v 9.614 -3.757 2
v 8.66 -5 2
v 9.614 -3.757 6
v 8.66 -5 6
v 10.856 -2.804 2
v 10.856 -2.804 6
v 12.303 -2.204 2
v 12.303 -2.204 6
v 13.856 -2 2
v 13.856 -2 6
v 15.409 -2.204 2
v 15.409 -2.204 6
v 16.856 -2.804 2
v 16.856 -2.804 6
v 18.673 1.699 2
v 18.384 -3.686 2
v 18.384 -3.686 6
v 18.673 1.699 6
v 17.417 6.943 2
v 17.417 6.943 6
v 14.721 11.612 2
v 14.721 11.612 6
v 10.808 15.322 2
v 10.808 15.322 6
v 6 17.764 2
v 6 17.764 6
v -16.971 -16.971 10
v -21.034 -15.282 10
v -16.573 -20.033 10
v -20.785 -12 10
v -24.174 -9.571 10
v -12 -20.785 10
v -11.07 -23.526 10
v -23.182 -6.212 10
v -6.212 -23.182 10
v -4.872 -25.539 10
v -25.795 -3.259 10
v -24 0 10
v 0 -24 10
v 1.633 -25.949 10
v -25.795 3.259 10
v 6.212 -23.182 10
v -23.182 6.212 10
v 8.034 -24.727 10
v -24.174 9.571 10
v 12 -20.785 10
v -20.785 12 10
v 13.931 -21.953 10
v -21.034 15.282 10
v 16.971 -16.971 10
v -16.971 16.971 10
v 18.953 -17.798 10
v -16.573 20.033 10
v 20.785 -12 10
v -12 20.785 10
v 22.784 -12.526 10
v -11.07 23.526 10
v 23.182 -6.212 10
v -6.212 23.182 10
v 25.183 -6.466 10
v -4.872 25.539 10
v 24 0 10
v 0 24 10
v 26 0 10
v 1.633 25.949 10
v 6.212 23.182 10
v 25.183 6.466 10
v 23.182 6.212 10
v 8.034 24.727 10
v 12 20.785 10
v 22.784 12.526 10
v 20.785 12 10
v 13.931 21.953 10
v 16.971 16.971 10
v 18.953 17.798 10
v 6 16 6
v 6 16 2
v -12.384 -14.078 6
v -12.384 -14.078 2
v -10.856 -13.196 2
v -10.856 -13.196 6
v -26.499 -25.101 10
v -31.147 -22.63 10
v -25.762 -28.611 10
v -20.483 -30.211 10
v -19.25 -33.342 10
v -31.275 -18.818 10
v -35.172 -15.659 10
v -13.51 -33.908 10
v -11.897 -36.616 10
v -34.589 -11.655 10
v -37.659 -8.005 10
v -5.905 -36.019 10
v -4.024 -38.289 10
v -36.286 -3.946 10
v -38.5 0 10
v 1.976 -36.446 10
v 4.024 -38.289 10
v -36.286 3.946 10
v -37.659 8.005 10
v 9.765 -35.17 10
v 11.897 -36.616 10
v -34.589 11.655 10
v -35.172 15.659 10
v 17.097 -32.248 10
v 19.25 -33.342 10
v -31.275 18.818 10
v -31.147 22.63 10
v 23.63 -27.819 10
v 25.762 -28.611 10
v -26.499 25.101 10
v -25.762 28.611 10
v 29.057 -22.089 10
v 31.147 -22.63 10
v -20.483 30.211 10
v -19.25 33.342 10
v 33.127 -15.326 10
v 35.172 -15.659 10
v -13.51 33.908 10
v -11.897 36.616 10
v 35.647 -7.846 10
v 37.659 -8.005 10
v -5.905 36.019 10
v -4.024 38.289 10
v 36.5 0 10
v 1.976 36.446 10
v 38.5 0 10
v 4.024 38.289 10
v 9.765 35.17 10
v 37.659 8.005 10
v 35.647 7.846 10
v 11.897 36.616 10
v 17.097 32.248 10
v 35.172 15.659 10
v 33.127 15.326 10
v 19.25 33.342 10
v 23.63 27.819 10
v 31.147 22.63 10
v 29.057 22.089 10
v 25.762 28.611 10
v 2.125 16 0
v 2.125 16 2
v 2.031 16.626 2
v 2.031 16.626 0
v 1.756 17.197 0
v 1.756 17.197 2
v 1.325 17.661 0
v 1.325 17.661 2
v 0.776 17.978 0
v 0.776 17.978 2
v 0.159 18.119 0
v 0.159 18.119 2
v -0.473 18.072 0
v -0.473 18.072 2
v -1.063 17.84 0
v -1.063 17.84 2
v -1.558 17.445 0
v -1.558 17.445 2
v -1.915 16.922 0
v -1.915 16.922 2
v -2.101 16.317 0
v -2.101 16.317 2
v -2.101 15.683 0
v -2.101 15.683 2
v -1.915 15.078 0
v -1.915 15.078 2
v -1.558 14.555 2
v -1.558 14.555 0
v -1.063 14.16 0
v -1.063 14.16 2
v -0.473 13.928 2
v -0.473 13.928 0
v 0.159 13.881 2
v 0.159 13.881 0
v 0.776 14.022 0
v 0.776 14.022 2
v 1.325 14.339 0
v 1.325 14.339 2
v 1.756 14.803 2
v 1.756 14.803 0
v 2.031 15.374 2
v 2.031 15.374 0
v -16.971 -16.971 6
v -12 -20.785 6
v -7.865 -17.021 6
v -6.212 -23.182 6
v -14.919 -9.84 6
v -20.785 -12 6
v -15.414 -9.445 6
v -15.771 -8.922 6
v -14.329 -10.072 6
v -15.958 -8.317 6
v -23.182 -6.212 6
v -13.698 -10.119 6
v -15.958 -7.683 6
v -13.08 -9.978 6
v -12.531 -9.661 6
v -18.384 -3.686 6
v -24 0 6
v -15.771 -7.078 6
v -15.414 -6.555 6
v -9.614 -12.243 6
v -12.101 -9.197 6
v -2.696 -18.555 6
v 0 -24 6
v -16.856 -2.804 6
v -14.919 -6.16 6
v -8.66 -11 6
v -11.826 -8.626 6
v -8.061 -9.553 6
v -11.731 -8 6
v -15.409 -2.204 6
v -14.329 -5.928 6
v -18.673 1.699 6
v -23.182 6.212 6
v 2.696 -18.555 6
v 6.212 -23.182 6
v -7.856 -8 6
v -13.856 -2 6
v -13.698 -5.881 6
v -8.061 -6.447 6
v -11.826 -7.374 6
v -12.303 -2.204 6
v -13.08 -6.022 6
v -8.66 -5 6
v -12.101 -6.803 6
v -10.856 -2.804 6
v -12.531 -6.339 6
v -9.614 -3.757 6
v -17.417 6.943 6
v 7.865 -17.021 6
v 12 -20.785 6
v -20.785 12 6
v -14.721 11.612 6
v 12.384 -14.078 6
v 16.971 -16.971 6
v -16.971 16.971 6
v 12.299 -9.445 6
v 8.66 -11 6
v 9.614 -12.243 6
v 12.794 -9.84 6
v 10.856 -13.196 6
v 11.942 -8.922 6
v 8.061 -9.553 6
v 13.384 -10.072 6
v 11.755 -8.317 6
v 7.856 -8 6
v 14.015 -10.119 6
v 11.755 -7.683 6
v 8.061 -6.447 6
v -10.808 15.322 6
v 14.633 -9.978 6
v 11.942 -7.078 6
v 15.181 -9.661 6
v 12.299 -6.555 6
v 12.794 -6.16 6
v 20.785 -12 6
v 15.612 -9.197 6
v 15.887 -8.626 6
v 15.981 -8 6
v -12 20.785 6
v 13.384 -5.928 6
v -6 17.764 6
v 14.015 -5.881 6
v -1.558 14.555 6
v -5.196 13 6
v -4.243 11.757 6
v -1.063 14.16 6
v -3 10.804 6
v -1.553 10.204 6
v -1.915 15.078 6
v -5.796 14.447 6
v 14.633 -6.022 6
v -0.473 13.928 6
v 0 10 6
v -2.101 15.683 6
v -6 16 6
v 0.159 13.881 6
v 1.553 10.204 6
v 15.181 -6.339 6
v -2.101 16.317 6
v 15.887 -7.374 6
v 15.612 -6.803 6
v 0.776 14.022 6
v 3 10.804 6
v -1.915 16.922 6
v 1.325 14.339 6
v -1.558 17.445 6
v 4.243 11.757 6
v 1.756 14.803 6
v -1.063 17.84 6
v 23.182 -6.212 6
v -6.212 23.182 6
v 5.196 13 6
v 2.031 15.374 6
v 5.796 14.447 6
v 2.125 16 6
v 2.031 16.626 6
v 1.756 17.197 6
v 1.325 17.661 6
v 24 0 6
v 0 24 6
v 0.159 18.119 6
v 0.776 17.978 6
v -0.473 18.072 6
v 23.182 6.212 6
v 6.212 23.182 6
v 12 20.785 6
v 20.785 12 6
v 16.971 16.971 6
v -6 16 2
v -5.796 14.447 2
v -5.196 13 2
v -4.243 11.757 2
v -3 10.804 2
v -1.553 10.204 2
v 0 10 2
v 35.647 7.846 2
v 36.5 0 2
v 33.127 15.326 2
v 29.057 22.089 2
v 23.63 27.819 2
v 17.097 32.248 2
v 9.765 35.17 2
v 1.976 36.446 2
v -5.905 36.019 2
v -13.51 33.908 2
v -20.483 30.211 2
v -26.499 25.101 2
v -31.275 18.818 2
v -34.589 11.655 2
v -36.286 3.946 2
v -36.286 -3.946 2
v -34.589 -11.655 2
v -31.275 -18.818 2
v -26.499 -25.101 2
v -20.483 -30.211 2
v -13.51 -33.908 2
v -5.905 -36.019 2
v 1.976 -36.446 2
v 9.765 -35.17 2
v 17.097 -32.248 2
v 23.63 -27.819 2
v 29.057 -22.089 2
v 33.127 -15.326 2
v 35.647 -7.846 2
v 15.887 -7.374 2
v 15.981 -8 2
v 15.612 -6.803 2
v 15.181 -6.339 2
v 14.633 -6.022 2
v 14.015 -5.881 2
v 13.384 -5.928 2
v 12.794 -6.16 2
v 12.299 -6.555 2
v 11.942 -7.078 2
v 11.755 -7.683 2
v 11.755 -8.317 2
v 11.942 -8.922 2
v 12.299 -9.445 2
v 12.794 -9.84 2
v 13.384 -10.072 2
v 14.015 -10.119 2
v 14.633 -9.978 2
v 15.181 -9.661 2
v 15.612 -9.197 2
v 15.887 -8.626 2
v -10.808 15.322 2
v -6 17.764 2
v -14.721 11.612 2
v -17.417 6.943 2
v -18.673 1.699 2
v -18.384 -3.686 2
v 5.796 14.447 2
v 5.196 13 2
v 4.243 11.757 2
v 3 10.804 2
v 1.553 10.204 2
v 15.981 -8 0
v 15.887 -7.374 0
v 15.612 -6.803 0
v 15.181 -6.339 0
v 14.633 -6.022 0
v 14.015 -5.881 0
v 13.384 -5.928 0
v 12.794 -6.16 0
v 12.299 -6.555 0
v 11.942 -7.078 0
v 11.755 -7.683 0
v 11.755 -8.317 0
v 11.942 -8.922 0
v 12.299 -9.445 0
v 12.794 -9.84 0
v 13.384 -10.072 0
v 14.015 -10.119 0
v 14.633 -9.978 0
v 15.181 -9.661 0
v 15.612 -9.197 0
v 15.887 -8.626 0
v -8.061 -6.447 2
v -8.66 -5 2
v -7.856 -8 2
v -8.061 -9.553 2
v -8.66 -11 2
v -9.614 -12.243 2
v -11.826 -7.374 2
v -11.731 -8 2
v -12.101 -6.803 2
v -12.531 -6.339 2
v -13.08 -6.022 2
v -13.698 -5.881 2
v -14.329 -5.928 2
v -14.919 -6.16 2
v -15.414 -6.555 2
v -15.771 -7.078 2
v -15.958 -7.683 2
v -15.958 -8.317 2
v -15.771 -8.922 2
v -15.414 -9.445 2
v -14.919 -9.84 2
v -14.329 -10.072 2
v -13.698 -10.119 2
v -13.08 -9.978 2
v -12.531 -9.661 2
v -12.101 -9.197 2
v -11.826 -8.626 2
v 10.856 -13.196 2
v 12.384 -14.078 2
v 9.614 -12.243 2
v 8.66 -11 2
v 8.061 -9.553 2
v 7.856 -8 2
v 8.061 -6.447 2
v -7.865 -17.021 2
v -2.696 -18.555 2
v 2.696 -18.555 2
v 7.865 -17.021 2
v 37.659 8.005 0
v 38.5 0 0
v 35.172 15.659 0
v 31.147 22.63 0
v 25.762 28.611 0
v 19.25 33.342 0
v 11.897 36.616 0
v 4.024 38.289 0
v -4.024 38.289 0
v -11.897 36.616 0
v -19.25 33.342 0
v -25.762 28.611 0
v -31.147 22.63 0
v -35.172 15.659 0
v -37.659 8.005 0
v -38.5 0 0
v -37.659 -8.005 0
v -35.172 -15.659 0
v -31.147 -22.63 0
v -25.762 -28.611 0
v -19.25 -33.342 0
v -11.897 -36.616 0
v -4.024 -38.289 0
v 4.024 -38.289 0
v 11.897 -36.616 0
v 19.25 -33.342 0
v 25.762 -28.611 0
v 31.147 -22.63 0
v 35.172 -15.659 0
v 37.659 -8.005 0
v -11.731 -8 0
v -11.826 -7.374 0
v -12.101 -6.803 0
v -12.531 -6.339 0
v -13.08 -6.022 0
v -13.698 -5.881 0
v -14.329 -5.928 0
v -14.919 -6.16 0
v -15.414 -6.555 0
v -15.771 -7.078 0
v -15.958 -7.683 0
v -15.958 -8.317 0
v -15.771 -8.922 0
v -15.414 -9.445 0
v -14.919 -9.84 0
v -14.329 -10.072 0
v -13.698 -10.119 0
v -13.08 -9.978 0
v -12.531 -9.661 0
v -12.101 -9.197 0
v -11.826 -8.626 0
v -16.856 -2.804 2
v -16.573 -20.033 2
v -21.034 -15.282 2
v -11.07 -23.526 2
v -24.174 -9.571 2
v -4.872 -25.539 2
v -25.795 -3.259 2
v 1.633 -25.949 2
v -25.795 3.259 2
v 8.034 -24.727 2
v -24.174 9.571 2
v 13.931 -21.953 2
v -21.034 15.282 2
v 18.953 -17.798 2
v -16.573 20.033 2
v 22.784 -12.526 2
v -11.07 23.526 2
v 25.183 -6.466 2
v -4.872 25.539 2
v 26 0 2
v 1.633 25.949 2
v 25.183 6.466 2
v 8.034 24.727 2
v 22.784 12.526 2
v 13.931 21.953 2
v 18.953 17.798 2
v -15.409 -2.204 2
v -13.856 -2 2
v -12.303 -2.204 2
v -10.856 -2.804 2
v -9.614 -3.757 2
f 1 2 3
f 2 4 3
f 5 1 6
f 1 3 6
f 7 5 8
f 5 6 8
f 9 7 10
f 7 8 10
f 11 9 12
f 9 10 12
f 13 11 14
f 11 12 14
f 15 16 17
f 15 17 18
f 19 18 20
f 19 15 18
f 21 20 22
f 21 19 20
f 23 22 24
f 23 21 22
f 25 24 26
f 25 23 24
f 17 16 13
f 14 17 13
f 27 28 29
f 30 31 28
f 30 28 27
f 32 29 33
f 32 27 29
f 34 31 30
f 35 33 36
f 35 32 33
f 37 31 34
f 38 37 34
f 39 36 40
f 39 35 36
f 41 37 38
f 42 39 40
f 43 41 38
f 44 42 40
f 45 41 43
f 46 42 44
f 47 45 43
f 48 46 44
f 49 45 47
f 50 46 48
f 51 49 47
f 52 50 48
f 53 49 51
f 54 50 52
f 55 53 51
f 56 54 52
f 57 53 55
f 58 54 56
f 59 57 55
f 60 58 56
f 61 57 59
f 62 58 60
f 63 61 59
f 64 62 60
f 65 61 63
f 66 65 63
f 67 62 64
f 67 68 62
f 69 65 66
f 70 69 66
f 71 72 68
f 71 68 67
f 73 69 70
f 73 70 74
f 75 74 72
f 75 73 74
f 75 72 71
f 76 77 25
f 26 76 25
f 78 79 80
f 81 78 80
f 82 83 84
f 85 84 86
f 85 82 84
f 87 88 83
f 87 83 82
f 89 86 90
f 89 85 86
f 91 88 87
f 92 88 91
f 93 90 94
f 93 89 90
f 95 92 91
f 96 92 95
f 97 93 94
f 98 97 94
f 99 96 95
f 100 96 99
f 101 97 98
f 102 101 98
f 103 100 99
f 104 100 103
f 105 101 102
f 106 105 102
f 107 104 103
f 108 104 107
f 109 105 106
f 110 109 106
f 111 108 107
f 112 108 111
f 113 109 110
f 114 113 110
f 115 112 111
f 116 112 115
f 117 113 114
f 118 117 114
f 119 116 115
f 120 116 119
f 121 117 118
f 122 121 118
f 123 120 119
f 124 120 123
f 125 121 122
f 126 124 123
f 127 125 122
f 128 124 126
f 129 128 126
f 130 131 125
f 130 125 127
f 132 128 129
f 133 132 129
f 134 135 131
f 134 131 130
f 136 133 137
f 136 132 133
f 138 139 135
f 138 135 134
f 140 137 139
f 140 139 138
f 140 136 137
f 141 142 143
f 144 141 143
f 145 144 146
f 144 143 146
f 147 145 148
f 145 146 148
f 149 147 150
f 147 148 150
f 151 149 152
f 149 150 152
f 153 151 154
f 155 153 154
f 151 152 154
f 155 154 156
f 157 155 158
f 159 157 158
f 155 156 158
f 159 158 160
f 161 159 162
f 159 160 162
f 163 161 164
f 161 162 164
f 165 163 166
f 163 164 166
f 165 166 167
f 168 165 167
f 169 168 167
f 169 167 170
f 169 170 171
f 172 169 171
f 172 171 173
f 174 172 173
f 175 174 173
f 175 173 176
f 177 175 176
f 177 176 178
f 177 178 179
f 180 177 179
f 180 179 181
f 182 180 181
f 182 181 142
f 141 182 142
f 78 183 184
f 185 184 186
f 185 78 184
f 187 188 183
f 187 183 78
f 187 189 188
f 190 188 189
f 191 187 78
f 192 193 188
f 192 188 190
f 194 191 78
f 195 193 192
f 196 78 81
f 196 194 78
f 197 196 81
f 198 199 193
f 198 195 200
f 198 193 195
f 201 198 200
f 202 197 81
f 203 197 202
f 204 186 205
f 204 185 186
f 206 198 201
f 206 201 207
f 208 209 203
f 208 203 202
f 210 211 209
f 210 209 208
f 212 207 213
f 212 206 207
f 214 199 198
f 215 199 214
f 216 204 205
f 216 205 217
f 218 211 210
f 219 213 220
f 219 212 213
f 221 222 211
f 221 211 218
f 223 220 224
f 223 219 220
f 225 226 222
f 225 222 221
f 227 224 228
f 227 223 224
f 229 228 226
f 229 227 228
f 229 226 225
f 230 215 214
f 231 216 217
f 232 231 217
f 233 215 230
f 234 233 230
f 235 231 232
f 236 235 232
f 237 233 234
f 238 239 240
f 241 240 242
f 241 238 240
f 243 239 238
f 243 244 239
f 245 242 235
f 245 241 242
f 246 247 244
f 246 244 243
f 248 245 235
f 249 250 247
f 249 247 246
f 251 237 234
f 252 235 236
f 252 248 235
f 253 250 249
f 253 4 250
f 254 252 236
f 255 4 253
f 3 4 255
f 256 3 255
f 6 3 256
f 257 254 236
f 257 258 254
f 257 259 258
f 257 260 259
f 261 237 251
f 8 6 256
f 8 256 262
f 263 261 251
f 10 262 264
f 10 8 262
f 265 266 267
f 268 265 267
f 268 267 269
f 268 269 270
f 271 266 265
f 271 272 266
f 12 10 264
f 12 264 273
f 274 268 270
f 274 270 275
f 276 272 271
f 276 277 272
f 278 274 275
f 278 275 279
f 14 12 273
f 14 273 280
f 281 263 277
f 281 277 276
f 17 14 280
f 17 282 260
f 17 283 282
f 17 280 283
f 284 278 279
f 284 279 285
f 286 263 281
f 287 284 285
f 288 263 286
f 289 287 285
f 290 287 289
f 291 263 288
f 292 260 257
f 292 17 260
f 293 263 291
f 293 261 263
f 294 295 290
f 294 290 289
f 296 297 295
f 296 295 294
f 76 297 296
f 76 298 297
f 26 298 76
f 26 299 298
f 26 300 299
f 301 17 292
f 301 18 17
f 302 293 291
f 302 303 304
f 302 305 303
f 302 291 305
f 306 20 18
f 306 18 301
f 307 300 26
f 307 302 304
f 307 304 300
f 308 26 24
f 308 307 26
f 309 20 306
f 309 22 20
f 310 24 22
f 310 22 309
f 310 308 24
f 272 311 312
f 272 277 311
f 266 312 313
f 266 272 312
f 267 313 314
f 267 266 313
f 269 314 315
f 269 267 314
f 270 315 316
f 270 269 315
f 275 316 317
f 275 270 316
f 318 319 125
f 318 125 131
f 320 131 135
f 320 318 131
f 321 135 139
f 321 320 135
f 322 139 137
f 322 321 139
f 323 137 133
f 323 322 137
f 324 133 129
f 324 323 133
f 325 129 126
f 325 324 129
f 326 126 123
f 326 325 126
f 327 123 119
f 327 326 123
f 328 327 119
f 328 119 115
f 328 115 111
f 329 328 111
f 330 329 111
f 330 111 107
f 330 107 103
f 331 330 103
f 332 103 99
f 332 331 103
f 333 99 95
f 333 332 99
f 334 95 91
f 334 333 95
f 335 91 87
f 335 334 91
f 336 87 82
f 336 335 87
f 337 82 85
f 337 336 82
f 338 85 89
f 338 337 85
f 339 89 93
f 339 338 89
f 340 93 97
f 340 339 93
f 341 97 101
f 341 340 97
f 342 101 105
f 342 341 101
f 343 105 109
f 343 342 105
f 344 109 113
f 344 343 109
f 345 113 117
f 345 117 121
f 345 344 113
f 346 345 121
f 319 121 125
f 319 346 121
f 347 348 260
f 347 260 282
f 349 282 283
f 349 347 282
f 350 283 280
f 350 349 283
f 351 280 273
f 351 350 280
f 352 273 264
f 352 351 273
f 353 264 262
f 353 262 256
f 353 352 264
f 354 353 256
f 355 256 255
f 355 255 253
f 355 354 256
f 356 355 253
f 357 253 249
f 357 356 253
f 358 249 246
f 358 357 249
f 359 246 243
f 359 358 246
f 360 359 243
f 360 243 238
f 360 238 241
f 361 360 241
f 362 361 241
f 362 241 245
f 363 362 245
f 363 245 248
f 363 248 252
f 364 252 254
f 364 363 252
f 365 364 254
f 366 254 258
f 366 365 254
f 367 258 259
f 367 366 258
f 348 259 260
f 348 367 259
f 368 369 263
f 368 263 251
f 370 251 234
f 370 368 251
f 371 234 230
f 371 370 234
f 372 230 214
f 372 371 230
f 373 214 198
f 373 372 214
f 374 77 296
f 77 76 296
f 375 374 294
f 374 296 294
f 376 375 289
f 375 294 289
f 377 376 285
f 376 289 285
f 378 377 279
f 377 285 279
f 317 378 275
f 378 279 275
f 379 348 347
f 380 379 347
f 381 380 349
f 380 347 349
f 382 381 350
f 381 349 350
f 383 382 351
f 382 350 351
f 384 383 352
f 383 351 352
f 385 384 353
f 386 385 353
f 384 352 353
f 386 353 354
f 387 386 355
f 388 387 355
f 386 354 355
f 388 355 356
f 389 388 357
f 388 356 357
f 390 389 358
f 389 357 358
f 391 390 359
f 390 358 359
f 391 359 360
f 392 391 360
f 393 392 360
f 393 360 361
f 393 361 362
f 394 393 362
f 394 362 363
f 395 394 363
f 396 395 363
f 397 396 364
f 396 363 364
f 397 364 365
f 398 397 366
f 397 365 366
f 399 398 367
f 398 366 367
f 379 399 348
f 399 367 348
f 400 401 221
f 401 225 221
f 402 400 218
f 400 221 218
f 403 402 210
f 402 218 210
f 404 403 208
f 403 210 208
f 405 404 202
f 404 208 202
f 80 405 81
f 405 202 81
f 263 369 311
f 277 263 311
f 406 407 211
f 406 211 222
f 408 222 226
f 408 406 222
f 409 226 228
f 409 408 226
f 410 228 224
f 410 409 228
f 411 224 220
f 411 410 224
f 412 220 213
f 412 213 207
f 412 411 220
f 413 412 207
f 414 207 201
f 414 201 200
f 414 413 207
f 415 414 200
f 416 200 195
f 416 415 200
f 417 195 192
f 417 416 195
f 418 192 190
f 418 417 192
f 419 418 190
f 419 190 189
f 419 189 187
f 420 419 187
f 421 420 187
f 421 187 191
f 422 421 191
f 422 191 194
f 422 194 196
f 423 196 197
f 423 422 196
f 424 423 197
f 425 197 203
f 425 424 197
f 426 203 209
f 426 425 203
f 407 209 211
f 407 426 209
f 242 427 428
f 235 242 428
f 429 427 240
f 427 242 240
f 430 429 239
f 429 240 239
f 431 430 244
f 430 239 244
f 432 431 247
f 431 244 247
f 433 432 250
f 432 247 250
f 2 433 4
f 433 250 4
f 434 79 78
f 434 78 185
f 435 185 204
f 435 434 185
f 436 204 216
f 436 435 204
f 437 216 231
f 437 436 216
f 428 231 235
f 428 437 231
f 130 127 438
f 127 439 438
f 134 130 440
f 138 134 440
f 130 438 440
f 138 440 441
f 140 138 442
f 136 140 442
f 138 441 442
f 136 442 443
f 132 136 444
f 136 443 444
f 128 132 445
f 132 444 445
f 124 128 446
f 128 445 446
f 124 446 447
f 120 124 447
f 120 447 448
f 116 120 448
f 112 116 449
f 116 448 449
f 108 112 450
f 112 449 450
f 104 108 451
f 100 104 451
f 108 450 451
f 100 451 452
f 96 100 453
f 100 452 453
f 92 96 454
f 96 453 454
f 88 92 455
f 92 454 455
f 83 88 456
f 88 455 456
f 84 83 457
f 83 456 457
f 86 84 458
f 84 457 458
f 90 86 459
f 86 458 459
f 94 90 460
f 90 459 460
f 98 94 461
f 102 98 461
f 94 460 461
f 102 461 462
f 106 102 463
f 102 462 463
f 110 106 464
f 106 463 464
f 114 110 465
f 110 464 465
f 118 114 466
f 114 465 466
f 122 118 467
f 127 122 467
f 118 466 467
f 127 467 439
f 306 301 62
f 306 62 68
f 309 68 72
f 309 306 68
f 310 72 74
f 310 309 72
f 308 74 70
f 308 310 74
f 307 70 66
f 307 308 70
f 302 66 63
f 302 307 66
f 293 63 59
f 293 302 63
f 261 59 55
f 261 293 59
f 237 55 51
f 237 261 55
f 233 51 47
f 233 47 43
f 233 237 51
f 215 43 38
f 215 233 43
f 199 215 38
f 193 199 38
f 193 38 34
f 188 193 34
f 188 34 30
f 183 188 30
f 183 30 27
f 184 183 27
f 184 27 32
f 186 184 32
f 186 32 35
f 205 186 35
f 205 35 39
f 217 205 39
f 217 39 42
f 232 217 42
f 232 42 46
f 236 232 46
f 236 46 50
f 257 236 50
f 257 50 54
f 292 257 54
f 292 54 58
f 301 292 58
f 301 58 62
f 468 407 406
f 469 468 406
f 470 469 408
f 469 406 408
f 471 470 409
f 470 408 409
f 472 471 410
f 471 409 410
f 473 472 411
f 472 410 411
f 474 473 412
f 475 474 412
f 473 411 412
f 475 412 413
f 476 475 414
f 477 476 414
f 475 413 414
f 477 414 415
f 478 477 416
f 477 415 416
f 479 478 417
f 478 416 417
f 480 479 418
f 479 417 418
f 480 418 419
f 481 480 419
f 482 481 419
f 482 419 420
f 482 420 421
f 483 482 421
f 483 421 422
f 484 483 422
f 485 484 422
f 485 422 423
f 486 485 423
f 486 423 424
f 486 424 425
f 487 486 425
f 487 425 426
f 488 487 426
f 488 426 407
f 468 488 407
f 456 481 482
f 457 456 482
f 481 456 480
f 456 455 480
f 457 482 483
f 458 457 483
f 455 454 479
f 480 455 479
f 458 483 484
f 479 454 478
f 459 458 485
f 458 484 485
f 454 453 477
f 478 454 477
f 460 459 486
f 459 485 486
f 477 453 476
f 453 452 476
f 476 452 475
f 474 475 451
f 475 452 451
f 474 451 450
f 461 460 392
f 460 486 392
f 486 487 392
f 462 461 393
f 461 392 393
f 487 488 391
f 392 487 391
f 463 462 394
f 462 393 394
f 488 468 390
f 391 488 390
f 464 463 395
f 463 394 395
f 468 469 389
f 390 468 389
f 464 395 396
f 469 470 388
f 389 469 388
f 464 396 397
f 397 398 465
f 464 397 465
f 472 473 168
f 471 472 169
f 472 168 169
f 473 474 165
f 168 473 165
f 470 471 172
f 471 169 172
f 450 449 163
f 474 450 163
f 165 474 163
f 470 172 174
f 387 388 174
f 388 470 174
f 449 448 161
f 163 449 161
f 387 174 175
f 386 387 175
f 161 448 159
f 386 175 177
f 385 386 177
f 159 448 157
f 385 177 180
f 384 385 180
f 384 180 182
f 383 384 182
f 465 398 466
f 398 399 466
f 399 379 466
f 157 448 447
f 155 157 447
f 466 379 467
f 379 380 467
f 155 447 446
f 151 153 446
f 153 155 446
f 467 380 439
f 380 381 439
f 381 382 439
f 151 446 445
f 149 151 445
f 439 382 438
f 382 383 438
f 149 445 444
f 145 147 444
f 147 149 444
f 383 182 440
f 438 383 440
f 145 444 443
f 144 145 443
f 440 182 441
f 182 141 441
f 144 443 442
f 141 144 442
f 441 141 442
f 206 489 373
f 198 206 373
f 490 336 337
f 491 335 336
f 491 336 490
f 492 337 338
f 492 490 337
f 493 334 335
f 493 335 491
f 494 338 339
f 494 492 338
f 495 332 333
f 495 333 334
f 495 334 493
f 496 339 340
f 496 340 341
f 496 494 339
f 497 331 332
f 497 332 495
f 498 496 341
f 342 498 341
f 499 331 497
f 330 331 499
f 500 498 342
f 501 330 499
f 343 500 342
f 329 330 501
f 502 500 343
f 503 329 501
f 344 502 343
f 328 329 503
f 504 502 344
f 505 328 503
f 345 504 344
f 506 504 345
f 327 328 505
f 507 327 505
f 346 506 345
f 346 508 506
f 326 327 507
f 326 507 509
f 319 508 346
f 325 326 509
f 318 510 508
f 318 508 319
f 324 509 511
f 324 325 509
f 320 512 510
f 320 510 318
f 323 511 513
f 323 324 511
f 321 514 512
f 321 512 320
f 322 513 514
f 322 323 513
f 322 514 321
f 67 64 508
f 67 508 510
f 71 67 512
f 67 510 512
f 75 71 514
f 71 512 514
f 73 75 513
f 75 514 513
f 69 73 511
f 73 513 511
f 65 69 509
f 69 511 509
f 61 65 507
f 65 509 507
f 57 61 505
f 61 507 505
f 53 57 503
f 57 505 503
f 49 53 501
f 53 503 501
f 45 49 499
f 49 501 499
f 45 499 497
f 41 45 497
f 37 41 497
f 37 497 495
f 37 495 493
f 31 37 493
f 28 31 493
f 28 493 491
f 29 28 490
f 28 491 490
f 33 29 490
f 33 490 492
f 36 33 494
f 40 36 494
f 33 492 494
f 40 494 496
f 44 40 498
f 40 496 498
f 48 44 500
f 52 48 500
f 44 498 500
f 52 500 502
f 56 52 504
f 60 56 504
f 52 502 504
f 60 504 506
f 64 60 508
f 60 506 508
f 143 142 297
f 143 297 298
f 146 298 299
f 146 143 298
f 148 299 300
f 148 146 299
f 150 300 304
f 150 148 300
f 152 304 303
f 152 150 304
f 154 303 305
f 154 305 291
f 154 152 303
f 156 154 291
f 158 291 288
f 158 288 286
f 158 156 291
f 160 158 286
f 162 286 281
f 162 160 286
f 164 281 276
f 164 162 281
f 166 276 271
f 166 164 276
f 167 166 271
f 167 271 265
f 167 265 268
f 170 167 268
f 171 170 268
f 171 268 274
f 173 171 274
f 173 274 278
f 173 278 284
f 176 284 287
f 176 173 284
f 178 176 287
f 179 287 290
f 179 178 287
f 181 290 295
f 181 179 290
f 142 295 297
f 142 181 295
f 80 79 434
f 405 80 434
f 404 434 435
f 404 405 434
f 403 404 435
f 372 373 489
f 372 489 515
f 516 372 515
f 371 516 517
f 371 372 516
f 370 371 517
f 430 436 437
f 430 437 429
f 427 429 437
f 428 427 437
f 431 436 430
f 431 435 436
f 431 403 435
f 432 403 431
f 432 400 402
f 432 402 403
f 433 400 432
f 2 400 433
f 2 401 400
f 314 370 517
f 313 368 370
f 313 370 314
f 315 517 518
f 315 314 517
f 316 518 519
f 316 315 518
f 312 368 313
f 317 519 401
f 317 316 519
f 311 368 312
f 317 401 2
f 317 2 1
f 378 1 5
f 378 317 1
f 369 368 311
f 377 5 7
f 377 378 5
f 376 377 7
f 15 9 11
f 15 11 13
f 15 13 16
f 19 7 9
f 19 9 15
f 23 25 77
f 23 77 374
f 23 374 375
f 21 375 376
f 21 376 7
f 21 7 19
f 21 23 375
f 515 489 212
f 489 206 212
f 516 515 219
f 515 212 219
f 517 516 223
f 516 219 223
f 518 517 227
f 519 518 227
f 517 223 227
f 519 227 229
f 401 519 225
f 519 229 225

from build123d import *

# Parameters (mm, degrees)
F0_R      = 38.5
F1_DEPTH  = 2
F2_R      = 38.5
F2_R_2    = 36.5
F3_DEPTH  = 8
F4_R      = 26
F4_R_2    = 24
F5_DEPTH  = 8
F6_R      = 24
F6_R_2    = 18.75
F7_DEPTH  = 4
F8_R      = 2.125
F9_DEPTH  = 12.5
F10_R     = 2.125
F11_DEPTH = 4
F12_R     = 5.99999


# Not quite as in the source:
# - a fillet or chamfer is up to 0.001 mm smaller than in the source, because OpenCascade refuses the exact size


with BuildPart() as f1:
    # F0 (on Top) → F1 (new body)
    with BuildSketch(Plane.XY):
        Circle(F0_R)
    extrude(amount=F1_DEPTH)

    # F2 (on face) → F3 (join)
    with BuildSketch(Plane.XY.offset(2)):
        Circle(F2_R)
        Circle(F2_R_2, mode=Mode.SUBTRACT)
    extrude(amount=F3_DEPTH)

    # F4 (on face) → F5 (join)
    with BuildSketch(Plane.XY.offset(2)):
        Circle(F4_R)
        Circle(F4_R_2, mode=Mode.SUBTRACT)
    extrude(amount=F5_DEPTH)

    # F6 (on face) → F7 (join)
    with BuildSketch(Plane.XY.offset(2)):
        Circle(F6_R)
        Circle(F6_R_2, mode=Mode.SUBTRACT)
    extrude(amount=F7_DEPTH)

    # F8 (on face) → F9 (cut, symmetric)
    with BuildSketch(Plane.XY.offset(2)):
        with Locations((0, 16)):
            Circle(F8_R)
        with Locations((-13.8564064606, -8)):
            Circle(F8_R)
        with Locations((13.8564064606, -8)):
            Circle(F8_R)
    extrude(amount=F9_DEPTH, both=True, mode=Mode.SUBTRACT)

    # F10 (on face) → F11 (join)
    with BuildSketch(Plane.XY.offset(2)):
        with BuildLine():
            Line((6, 16), (6, 17.7640789235))
            ThreePointArc((6, 17.7640789235), (0, 18.75), (-6, 17.7640789235))
            Line((-6, 17.7640789235), (-6, 16))
            Line((-6, 16), (-6, 10))
            Line((-6, 10), (0, 10))
            Line((0, 10), (6, 10))
            Line((6, 10), (6, 16))
        make_face()
        with Locations((0, 16)):
            Circle(F10_R, mode=Mode.SUBTRACT)
        with BuildLine():
            Line((-16.8564064606, -2.8038475773), (-18.3841436226, -3.685887039))
            ThreePointArc((-18.3841436226, -3.685887039), (-16.237976321, -9.375), (-12.3841436226, -14.0781918845))
            Line((-12.3841436226, -14.0781918845), (-10.8564064606, -13.1961524227))
            Line((-10.8564064606, -13.1961524227), (-5.6602540378, -10.1961524227))
            Line((-5.6602540378, -10.1961524227), (-8.6602540378, -5))
            Line((-8.6602540378, -5), (-11.6602540378, 0.1961524227))
            Line((-11.6602540378, 0.1961524227), (-16.8564064606, -2.8038475773))
        make_face()
        with Locations((-13.8564064606, -8)):
            Circle(F10_R, mode=Mode.SUBTRACT)
        with BuildLine():
            ThreePointArc((12.3841436226, -14.0781918845), (16.237976321, -9.375), (18.3841436226, -3.685887039))
            Line((18.3841436226, -3.685887039), (16.8564064606, -2.8038475773))
            Line((16.8564064606, -2.8038475773), (11.6602540378, 0.1961524227))
            Line((11.6602540378, 0.1961524227), (8.6602540378, -5))
            Line((8.6602540378, -5), (5.6602540378, -10.1961524227))
            Line((5.6602540378, -10.1961524227), (10.8564064606, -13.1961524227))
            Line((10.8564064606, -13.1961524227), (12.3841436226, -14.0781918845))
        make_face()
        with Locations((13.8564064606, -8)):
            Circle(F10_R, mode=Mode.SUBTRACT)
    extrude(amount=F11_DEPTH)

    # F12 (radius 6 in the source; OpenCascade refuses exactly that, so slightly less here)
    f12_edges = [f1.edges().sort_by_distance(p)[0] for p in [
        (-6, 10, 4),
        (6, 10, 4),
        (11.660254, 0.196152, 4),
        (5.660254, -10.196152, 4),
        (-5.660254, -10.196152, 4),
        (-11.660254, 0.196152, 4),
    ]]
    fillet(f12_edges, radius=F12_R)


solid = f1.part
